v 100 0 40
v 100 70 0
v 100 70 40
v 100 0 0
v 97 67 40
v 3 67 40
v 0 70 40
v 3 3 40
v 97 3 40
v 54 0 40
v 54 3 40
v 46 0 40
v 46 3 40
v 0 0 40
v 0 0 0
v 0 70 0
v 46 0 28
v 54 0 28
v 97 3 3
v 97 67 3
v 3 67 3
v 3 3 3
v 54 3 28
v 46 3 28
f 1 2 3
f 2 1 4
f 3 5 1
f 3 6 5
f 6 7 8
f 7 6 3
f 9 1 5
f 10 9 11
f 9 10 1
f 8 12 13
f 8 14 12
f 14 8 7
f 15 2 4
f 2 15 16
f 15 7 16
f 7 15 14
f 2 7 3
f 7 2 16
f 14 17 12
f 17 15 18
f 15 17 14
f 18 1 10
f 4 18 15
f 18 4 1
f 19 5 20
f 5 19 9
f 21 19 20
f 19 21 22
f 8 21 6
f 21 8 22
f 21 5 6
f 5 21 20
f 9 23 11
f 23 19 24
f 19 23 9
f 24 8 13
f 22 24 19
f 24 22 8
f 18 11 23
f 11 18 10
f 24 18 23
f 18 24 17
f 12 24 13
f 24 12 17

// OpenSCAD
$fn = 32;

// ----------------------------------------------------------------------
// Enclosure box: notch enclosure
// ----------------------------------------------------------------------

// --- parameters (mm) ---
box_l = 100;              // outer length, X
box_w = 70;               // outer width, Y
box_h = 40;               // outer height
wall_t = 3;               // wall thickness
notch_w = 8;              // cable notch width
notch_h = 12;             // cable notch height

inner_h = box_h - wall_t;  // cavity depth
boss_h = inner_h - 2;  // corner boss height

difference() {
  union() {
    difference() {
      cube([box_l, box_w, box_h]);
      translate([wall_t, wall_t, wall_t])
        cube([box_l - 2 * wall_t, box_w - 2 * wall_t, box_h]);
    }
  }
  translate([box_l / 2 - notch_w / 2, -1, box_h - notch_h])
    cube([notch_w, wall_t + 2, notch_h + 1]);
}
